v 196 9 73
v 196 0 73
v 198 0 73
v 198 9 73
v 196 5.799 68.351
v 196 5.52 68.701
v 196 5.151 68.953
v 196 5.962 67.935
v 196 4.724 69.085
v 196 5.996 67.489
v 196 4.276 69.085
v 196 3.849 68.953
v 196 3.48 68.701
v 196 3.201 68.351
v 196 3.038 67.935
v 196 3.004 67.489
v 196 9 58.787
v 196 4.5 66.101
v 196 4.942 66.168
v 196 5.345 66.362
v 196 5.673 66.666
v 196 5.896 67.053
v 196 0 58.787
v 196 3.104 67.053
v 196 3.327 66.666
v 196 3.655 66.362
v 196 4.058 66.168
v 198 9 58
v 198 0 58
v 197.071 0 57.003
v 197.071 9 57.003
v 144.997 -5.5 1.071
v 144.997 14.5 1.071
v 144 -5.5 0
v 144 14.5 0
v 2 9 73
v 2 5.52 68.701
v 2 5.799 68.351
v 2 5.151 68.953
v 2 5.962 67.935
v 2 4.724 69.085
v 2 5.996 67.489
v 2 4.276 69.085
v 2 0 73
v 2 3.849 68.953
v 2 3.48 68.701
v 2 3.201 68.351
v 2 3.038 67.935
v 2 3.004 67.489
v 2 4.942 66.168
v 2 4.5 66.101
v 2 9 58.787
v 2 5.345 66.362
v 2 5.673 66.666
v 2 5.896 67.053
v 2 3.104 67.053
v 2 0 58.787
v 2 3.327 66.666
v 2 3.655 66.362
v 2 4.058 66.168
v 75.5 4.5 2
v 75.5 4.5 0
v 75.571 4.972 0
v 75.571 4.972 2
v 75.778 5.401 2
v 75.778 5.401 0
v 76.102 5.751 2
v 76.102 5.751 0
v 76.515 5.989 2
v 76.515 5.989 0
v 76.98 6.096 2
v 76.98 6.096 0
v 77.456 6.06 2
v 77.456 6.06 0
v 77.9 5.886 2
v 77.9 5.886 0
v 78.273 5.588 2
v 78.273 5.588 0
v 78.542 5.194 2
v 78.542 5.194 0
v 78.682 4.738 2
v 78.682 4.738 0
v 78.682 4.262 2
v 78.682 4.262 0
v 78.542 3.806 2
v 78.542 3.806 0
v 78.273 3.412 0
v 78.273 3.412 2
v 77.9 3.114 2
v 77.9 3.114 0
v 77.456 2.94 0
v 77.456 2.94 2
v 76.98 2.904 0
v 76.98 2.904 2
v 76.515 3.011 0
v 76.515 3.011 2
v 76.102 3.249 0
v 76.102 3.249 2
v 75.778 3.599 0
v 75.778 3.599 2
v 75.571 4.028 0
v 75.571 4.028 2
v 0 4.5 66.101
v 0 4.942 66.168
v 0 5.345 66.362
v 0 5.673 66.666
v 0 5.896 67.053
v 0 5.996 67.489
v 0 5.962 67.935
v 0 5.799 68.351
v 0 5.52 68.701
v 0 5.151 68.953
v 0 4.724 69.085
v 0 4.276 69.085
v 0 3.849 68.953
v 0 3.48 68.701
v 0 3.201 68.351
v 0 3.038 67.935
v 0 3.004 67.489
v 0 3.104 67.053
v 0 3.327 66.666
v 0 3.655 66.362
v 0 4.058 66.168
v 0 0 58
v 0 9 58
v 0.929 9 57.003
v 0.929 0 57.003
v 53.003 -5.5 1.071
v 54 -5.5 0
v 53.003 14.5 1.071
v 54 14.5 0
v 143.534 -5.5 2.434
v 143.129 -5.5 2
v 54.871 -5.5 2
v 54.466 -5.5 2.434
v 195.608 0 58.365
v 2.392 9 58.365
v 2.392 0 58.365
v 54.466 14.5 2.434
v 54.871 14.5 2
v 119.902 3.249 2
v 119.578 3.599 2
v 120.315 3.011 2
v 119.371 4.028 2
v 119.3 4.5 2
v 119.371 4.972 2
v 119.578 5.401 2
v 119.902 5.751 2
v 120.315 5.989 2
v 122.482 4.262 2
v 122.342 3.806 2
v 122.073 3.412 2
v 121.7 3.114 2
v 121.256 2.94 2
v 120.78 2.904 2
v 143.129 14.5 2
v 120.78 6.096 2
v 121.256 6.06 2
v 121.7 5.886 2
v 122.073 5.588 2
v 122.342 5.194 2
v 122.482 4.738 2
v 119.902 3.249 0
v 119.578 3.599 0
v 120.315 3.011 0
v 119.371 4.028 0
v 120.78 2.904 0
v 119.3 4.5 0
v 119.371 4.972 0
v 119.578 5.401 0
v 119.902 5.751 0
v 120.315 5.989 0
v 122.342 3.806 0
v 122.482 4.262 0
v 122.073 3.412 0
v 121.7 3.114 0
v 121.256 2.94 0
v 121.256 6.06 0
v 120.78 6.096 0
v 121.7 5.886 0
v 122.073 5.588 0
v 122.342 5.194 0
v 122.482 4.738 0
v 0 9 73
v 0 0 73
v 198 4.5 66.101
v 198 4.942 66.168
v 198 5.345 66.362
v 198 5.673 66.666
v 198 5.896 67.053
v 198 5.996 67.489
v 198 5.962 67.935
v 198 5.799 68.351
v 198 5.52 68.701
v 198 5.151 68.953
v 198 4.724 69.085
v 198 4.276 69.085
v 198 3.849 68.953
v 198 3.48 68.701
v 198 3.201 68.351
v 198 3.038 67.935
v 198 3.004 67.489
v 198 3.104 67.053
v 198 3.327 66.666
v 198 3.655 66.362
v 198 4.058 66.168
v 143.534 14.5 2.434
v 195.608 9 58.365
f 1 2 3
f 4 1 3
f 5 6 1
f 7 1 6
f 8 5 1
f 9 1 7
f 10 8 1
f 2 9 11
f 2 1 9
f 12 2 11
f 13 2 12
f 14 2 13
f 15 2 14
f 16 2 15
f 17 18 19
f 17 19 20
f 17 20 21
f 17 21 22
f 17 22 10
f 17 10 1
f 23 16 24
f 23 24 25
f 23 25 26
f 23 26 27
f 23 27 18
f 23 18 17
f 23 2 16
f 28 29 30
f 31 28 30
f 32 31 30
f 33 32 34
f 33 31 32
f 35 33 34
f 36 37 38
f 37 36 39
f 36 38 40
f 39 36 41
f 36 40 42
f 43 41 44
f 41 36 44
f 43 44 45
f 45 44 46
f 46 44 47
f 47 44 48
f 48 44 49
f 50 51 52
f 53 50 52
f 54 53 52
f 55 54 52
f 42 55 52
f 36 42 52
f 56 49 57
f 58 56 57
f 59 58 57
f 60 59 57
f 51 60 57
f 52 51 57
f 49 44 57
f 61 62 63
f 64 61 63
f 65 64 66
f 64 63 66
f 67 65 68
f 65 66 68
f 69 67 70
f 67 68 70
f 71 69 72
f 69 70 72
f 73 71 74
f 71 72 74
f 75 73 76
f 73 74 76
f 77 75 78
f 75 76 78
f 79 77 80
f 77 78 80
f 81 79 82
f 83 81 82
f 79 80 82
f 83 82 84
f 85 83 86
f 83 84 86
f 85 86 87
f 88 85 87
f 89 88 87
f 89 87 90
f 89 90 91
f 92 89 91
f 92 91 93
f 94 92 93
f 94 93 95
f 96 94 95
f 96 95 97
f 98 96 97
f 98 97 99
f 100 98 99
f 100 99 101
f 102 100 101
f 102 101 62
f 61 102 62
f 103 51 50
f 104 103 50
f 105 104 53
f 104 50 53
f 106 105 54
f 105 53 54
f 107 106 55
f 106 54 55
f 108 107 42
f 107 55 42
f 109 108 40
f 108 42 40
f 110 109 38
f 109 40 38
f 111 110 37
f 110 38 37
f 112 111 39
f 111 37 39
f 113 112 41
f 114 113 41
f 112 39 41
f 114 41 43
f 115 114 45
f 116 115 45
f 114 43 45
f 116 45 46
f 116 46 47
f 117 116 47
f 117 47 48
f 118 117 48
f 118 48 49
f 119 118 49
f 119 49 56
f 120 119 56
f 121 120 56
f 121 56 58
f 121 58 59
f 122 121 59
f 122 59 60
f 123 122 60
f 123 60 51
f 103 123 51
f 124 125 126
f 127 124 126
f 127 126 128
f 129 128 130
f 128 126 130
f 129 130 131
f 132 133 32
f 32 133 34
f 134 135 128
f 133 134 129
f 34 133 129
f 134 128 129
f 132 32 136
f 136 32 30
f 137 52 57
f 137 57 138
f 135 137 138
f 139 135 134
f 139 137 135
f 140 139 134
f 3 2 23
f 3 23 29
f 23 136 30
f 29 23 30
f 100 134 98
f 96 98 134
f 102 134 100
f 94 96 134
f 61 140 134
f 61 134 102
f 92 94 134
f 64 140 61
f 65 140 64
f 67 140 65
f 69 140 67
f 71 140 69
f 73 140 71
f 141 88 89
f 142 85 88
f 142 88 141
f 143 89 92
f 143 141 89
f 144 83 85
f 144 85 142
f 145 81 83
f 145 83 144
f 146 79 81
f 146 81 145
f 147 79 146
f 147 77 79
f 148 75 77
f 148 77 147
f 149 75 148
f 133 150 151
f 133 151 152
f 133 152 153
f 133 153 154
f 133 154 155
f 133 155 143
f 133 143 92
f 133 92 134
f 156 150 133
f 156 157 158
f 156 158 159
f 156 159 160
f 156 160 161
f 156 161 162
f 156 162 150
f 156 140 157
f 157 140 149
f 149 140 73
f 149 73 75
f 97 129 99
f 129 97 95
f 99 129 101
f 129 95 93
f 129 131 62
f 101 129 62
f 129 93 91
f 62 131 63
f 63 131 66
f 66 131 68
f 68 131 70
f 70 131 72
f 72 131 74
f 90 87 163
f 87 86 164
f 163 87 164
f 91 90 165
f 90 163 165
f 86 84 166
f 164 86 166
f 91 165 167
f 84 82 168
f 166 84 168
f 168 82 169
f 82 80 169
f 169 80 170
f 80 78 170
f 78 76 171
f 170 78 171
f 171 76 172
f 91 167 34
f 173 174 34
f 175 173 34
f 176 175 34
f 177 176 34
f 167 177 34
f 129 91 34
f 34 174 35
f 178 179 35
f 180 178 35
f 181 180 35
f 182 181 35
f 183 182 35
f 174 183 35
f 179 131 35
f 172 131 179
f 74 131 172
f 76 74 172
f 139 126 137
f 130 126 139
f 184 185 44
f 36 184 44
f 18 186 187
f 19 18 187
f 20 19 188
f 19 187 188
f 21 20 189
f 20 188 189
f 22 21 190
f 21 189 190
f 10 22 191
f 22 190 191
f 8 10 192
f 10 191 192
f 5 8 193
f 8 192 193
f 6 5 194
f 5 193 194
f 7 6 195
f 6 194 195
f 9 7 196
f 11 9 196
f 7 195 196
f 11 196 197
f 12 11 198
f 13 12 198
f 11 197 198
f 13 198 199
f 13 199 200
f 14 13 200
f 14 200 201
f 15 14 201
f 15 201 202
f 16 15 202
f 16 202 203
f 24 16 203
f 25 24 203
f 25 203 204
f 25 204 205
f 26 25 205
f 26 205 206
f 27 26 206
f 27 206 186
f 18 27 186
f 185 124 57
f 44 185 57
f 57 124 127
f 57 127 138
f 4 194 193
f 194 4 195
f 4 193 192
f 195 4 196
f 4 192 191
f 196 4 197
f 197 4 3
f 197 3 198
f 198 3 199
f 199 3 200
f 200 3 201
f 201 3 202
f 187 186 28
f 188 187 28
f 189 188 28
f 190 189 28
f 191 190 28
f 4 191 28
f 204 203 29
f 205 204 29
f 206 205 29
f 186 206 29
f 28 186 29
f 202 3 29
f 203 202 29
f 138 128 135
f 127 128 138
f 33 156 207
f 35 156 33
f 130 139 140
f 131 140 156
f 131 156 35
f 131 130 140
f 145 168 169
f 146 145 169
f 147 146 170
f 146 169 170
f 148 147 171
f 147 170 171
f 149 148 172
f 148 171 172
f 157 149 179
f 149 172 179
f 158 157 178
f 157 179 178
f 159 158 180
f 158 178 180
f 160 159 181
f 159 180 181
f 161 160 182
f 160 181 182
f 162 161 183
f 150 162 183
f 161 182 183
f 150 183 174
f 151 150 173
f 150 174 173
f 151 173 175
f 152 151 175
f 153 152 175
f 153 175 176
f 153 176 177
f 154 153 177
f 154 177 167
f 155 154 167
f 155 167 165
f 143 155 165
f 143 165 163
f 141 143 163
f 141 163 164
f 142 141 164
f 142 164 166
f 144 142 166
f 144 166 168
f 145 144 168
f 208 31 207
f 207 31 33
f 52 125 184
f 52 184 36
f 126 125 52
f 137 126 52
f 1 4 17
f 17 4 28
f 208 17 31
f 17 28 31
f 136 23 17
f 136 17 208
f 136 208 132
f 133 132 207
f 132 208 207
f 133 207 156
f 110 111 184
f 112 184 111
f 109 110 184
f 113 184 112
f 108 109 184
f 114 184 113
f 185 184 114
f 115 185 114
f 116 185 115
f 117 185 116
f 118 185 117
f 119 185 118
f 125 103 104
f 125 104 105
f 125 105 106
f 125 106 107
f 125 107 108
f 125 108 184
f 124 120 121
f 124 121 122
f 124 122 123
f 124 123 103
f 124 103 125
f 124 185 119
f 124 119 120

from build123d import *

# Parameters (mm, degrees)
SKETCH_1_W          = 2
SKETCH_1_H          = 15
EXTRUDE_1_DEPTH     = 9
EXTRUDE_1_2_DEPTH   = 9
SKETCH_2_R          = 1.5
CUT_EXTRUDE_1_DEPTH = 212.220264179
SKETCH_3_W          = 90
SKETCH_3_H          = 20
EXTRUDE_2_DEPTH     = 2
EXTRUDE_3_DEPTH     = 2
SKETCH_6_R          = 1.6
CUT_EXTRUDE_2_DEPTH = 10


with BuildPart() as part:
    # 草图1 → 凸台-拉伸1 (new body)
    with BuildSketch(Plane(origin=(0, 0, 0), x_dir=(1, 0, 0), z_dir=(0, 1, 0))):
        with Locations((1, -65.5)):
            Rectangle(SKETCH_1_W, SKETCH_1_H)
    extrude(amount=EXTRUDE_1_DEPTH)


with BuildPart() as body_2:
    # 草图1 → Extrude 1 2 (new body)
    with BuildSketch(Plane(origin=(0, 0, 0), x_dir=(1, 0, 0), z_dir=(0, 1, 0))):
        with Locations((197, -65.5)):
            Rectangle(SKETCH_1_W, SKETCH_1_H)
    extrude(amount=EXTRUDE_1_2_DEPTH)


with BuildPart() as cut_extrude_1_tool:
    # 草图2 → 切除-拉伸1 (new, through all)
    with BuildSketch(Plane(origin=(198, 0, 0), x_dir=(0, 0, -1), z_dir=(1, 0, 0))):
        with Locations((-67.601305665, 4.5)):
            Circle(SKETCH_2_R)
    extrude(amount=-CUT_EXTRUDE_1_DEPTH)


with BuildPart() as part_1:
    add(part.part)

    # 切除-拉伸1: cut by cut_extrude_1_tool
    add(cut_extrude_1_tool.part, mode=Mode.SUBTRACT)


with BuildPart() as body_2_1:
    add(body_2.part)

    # 切除-拉伸1: cut by cut_extrude_1_tool
    add(cut_extrude_1_tool.part, mode=Mode.SUBTRACT)



with BuildPart() as body_3:
    # 草图3 → 凸台-拉伸2 (new body)
    with BuildSketch(Plane.XY):
        with Locations((99, 4.5)):
            Rectangle(SKETCH_3_W, SKETCH_3_H)
    extrude(amount=EXTRUDE_2_DEPTH)


with BuildPart() as body_2_2:
    add(body_2_1.part)

    add(body_3.part)  # 凸台-拉伸3 merges body 3
    # 草图4 → 凸台-拉伸3 (add)
    with BuildSketch(Plane(origin=(77.136305732, 0, -71.81656051), x_dir=(-0.6814185279188432, 0, -0.7318939744313494), z_dir=(0.7318939744313494, 0, -0.6814185279188432))):
        Polygon((-176.007881989, 9), (-177.370719045, 9), (-177.370719045, 0), (-176.007881989, 0), (-99.588055969, -5.5), (-98.12426802, -5.5), (-98.12426802, 14.5), (-99.588055969, 14.5), align=None)
    extrude_3 = extrude(amount=-EXTRUDE_3_DEPTH)

    # 镜向1: 凸台-拉伸3 across plane
    add(extrude_3.mirror(Plane(origin=(99, 0, 0), x_dir=(0, 0, 1), z_dir=(1, 0, 0))))

    # Combine 1: union part
    add(part_1.part)

    # 草图6 → 切除-拉伸2 (cut)
    with BuildSketch(Plane(origin=(0, 0, 0), x_dir=(-1, 0, 0), z_dir=(0, 0, -1))):
        with Locations((-120.9, 4.5)):
            Circle(SKETCH_6_R)
        with Locations((-77.1, 4.5)):
            Circle(SKETCH_6_R)
    extrude(amount=-CUT_EXTRUDE_2_DEPTH, mode=Mode.SUBTRACT)


solid = body_2_2.part
